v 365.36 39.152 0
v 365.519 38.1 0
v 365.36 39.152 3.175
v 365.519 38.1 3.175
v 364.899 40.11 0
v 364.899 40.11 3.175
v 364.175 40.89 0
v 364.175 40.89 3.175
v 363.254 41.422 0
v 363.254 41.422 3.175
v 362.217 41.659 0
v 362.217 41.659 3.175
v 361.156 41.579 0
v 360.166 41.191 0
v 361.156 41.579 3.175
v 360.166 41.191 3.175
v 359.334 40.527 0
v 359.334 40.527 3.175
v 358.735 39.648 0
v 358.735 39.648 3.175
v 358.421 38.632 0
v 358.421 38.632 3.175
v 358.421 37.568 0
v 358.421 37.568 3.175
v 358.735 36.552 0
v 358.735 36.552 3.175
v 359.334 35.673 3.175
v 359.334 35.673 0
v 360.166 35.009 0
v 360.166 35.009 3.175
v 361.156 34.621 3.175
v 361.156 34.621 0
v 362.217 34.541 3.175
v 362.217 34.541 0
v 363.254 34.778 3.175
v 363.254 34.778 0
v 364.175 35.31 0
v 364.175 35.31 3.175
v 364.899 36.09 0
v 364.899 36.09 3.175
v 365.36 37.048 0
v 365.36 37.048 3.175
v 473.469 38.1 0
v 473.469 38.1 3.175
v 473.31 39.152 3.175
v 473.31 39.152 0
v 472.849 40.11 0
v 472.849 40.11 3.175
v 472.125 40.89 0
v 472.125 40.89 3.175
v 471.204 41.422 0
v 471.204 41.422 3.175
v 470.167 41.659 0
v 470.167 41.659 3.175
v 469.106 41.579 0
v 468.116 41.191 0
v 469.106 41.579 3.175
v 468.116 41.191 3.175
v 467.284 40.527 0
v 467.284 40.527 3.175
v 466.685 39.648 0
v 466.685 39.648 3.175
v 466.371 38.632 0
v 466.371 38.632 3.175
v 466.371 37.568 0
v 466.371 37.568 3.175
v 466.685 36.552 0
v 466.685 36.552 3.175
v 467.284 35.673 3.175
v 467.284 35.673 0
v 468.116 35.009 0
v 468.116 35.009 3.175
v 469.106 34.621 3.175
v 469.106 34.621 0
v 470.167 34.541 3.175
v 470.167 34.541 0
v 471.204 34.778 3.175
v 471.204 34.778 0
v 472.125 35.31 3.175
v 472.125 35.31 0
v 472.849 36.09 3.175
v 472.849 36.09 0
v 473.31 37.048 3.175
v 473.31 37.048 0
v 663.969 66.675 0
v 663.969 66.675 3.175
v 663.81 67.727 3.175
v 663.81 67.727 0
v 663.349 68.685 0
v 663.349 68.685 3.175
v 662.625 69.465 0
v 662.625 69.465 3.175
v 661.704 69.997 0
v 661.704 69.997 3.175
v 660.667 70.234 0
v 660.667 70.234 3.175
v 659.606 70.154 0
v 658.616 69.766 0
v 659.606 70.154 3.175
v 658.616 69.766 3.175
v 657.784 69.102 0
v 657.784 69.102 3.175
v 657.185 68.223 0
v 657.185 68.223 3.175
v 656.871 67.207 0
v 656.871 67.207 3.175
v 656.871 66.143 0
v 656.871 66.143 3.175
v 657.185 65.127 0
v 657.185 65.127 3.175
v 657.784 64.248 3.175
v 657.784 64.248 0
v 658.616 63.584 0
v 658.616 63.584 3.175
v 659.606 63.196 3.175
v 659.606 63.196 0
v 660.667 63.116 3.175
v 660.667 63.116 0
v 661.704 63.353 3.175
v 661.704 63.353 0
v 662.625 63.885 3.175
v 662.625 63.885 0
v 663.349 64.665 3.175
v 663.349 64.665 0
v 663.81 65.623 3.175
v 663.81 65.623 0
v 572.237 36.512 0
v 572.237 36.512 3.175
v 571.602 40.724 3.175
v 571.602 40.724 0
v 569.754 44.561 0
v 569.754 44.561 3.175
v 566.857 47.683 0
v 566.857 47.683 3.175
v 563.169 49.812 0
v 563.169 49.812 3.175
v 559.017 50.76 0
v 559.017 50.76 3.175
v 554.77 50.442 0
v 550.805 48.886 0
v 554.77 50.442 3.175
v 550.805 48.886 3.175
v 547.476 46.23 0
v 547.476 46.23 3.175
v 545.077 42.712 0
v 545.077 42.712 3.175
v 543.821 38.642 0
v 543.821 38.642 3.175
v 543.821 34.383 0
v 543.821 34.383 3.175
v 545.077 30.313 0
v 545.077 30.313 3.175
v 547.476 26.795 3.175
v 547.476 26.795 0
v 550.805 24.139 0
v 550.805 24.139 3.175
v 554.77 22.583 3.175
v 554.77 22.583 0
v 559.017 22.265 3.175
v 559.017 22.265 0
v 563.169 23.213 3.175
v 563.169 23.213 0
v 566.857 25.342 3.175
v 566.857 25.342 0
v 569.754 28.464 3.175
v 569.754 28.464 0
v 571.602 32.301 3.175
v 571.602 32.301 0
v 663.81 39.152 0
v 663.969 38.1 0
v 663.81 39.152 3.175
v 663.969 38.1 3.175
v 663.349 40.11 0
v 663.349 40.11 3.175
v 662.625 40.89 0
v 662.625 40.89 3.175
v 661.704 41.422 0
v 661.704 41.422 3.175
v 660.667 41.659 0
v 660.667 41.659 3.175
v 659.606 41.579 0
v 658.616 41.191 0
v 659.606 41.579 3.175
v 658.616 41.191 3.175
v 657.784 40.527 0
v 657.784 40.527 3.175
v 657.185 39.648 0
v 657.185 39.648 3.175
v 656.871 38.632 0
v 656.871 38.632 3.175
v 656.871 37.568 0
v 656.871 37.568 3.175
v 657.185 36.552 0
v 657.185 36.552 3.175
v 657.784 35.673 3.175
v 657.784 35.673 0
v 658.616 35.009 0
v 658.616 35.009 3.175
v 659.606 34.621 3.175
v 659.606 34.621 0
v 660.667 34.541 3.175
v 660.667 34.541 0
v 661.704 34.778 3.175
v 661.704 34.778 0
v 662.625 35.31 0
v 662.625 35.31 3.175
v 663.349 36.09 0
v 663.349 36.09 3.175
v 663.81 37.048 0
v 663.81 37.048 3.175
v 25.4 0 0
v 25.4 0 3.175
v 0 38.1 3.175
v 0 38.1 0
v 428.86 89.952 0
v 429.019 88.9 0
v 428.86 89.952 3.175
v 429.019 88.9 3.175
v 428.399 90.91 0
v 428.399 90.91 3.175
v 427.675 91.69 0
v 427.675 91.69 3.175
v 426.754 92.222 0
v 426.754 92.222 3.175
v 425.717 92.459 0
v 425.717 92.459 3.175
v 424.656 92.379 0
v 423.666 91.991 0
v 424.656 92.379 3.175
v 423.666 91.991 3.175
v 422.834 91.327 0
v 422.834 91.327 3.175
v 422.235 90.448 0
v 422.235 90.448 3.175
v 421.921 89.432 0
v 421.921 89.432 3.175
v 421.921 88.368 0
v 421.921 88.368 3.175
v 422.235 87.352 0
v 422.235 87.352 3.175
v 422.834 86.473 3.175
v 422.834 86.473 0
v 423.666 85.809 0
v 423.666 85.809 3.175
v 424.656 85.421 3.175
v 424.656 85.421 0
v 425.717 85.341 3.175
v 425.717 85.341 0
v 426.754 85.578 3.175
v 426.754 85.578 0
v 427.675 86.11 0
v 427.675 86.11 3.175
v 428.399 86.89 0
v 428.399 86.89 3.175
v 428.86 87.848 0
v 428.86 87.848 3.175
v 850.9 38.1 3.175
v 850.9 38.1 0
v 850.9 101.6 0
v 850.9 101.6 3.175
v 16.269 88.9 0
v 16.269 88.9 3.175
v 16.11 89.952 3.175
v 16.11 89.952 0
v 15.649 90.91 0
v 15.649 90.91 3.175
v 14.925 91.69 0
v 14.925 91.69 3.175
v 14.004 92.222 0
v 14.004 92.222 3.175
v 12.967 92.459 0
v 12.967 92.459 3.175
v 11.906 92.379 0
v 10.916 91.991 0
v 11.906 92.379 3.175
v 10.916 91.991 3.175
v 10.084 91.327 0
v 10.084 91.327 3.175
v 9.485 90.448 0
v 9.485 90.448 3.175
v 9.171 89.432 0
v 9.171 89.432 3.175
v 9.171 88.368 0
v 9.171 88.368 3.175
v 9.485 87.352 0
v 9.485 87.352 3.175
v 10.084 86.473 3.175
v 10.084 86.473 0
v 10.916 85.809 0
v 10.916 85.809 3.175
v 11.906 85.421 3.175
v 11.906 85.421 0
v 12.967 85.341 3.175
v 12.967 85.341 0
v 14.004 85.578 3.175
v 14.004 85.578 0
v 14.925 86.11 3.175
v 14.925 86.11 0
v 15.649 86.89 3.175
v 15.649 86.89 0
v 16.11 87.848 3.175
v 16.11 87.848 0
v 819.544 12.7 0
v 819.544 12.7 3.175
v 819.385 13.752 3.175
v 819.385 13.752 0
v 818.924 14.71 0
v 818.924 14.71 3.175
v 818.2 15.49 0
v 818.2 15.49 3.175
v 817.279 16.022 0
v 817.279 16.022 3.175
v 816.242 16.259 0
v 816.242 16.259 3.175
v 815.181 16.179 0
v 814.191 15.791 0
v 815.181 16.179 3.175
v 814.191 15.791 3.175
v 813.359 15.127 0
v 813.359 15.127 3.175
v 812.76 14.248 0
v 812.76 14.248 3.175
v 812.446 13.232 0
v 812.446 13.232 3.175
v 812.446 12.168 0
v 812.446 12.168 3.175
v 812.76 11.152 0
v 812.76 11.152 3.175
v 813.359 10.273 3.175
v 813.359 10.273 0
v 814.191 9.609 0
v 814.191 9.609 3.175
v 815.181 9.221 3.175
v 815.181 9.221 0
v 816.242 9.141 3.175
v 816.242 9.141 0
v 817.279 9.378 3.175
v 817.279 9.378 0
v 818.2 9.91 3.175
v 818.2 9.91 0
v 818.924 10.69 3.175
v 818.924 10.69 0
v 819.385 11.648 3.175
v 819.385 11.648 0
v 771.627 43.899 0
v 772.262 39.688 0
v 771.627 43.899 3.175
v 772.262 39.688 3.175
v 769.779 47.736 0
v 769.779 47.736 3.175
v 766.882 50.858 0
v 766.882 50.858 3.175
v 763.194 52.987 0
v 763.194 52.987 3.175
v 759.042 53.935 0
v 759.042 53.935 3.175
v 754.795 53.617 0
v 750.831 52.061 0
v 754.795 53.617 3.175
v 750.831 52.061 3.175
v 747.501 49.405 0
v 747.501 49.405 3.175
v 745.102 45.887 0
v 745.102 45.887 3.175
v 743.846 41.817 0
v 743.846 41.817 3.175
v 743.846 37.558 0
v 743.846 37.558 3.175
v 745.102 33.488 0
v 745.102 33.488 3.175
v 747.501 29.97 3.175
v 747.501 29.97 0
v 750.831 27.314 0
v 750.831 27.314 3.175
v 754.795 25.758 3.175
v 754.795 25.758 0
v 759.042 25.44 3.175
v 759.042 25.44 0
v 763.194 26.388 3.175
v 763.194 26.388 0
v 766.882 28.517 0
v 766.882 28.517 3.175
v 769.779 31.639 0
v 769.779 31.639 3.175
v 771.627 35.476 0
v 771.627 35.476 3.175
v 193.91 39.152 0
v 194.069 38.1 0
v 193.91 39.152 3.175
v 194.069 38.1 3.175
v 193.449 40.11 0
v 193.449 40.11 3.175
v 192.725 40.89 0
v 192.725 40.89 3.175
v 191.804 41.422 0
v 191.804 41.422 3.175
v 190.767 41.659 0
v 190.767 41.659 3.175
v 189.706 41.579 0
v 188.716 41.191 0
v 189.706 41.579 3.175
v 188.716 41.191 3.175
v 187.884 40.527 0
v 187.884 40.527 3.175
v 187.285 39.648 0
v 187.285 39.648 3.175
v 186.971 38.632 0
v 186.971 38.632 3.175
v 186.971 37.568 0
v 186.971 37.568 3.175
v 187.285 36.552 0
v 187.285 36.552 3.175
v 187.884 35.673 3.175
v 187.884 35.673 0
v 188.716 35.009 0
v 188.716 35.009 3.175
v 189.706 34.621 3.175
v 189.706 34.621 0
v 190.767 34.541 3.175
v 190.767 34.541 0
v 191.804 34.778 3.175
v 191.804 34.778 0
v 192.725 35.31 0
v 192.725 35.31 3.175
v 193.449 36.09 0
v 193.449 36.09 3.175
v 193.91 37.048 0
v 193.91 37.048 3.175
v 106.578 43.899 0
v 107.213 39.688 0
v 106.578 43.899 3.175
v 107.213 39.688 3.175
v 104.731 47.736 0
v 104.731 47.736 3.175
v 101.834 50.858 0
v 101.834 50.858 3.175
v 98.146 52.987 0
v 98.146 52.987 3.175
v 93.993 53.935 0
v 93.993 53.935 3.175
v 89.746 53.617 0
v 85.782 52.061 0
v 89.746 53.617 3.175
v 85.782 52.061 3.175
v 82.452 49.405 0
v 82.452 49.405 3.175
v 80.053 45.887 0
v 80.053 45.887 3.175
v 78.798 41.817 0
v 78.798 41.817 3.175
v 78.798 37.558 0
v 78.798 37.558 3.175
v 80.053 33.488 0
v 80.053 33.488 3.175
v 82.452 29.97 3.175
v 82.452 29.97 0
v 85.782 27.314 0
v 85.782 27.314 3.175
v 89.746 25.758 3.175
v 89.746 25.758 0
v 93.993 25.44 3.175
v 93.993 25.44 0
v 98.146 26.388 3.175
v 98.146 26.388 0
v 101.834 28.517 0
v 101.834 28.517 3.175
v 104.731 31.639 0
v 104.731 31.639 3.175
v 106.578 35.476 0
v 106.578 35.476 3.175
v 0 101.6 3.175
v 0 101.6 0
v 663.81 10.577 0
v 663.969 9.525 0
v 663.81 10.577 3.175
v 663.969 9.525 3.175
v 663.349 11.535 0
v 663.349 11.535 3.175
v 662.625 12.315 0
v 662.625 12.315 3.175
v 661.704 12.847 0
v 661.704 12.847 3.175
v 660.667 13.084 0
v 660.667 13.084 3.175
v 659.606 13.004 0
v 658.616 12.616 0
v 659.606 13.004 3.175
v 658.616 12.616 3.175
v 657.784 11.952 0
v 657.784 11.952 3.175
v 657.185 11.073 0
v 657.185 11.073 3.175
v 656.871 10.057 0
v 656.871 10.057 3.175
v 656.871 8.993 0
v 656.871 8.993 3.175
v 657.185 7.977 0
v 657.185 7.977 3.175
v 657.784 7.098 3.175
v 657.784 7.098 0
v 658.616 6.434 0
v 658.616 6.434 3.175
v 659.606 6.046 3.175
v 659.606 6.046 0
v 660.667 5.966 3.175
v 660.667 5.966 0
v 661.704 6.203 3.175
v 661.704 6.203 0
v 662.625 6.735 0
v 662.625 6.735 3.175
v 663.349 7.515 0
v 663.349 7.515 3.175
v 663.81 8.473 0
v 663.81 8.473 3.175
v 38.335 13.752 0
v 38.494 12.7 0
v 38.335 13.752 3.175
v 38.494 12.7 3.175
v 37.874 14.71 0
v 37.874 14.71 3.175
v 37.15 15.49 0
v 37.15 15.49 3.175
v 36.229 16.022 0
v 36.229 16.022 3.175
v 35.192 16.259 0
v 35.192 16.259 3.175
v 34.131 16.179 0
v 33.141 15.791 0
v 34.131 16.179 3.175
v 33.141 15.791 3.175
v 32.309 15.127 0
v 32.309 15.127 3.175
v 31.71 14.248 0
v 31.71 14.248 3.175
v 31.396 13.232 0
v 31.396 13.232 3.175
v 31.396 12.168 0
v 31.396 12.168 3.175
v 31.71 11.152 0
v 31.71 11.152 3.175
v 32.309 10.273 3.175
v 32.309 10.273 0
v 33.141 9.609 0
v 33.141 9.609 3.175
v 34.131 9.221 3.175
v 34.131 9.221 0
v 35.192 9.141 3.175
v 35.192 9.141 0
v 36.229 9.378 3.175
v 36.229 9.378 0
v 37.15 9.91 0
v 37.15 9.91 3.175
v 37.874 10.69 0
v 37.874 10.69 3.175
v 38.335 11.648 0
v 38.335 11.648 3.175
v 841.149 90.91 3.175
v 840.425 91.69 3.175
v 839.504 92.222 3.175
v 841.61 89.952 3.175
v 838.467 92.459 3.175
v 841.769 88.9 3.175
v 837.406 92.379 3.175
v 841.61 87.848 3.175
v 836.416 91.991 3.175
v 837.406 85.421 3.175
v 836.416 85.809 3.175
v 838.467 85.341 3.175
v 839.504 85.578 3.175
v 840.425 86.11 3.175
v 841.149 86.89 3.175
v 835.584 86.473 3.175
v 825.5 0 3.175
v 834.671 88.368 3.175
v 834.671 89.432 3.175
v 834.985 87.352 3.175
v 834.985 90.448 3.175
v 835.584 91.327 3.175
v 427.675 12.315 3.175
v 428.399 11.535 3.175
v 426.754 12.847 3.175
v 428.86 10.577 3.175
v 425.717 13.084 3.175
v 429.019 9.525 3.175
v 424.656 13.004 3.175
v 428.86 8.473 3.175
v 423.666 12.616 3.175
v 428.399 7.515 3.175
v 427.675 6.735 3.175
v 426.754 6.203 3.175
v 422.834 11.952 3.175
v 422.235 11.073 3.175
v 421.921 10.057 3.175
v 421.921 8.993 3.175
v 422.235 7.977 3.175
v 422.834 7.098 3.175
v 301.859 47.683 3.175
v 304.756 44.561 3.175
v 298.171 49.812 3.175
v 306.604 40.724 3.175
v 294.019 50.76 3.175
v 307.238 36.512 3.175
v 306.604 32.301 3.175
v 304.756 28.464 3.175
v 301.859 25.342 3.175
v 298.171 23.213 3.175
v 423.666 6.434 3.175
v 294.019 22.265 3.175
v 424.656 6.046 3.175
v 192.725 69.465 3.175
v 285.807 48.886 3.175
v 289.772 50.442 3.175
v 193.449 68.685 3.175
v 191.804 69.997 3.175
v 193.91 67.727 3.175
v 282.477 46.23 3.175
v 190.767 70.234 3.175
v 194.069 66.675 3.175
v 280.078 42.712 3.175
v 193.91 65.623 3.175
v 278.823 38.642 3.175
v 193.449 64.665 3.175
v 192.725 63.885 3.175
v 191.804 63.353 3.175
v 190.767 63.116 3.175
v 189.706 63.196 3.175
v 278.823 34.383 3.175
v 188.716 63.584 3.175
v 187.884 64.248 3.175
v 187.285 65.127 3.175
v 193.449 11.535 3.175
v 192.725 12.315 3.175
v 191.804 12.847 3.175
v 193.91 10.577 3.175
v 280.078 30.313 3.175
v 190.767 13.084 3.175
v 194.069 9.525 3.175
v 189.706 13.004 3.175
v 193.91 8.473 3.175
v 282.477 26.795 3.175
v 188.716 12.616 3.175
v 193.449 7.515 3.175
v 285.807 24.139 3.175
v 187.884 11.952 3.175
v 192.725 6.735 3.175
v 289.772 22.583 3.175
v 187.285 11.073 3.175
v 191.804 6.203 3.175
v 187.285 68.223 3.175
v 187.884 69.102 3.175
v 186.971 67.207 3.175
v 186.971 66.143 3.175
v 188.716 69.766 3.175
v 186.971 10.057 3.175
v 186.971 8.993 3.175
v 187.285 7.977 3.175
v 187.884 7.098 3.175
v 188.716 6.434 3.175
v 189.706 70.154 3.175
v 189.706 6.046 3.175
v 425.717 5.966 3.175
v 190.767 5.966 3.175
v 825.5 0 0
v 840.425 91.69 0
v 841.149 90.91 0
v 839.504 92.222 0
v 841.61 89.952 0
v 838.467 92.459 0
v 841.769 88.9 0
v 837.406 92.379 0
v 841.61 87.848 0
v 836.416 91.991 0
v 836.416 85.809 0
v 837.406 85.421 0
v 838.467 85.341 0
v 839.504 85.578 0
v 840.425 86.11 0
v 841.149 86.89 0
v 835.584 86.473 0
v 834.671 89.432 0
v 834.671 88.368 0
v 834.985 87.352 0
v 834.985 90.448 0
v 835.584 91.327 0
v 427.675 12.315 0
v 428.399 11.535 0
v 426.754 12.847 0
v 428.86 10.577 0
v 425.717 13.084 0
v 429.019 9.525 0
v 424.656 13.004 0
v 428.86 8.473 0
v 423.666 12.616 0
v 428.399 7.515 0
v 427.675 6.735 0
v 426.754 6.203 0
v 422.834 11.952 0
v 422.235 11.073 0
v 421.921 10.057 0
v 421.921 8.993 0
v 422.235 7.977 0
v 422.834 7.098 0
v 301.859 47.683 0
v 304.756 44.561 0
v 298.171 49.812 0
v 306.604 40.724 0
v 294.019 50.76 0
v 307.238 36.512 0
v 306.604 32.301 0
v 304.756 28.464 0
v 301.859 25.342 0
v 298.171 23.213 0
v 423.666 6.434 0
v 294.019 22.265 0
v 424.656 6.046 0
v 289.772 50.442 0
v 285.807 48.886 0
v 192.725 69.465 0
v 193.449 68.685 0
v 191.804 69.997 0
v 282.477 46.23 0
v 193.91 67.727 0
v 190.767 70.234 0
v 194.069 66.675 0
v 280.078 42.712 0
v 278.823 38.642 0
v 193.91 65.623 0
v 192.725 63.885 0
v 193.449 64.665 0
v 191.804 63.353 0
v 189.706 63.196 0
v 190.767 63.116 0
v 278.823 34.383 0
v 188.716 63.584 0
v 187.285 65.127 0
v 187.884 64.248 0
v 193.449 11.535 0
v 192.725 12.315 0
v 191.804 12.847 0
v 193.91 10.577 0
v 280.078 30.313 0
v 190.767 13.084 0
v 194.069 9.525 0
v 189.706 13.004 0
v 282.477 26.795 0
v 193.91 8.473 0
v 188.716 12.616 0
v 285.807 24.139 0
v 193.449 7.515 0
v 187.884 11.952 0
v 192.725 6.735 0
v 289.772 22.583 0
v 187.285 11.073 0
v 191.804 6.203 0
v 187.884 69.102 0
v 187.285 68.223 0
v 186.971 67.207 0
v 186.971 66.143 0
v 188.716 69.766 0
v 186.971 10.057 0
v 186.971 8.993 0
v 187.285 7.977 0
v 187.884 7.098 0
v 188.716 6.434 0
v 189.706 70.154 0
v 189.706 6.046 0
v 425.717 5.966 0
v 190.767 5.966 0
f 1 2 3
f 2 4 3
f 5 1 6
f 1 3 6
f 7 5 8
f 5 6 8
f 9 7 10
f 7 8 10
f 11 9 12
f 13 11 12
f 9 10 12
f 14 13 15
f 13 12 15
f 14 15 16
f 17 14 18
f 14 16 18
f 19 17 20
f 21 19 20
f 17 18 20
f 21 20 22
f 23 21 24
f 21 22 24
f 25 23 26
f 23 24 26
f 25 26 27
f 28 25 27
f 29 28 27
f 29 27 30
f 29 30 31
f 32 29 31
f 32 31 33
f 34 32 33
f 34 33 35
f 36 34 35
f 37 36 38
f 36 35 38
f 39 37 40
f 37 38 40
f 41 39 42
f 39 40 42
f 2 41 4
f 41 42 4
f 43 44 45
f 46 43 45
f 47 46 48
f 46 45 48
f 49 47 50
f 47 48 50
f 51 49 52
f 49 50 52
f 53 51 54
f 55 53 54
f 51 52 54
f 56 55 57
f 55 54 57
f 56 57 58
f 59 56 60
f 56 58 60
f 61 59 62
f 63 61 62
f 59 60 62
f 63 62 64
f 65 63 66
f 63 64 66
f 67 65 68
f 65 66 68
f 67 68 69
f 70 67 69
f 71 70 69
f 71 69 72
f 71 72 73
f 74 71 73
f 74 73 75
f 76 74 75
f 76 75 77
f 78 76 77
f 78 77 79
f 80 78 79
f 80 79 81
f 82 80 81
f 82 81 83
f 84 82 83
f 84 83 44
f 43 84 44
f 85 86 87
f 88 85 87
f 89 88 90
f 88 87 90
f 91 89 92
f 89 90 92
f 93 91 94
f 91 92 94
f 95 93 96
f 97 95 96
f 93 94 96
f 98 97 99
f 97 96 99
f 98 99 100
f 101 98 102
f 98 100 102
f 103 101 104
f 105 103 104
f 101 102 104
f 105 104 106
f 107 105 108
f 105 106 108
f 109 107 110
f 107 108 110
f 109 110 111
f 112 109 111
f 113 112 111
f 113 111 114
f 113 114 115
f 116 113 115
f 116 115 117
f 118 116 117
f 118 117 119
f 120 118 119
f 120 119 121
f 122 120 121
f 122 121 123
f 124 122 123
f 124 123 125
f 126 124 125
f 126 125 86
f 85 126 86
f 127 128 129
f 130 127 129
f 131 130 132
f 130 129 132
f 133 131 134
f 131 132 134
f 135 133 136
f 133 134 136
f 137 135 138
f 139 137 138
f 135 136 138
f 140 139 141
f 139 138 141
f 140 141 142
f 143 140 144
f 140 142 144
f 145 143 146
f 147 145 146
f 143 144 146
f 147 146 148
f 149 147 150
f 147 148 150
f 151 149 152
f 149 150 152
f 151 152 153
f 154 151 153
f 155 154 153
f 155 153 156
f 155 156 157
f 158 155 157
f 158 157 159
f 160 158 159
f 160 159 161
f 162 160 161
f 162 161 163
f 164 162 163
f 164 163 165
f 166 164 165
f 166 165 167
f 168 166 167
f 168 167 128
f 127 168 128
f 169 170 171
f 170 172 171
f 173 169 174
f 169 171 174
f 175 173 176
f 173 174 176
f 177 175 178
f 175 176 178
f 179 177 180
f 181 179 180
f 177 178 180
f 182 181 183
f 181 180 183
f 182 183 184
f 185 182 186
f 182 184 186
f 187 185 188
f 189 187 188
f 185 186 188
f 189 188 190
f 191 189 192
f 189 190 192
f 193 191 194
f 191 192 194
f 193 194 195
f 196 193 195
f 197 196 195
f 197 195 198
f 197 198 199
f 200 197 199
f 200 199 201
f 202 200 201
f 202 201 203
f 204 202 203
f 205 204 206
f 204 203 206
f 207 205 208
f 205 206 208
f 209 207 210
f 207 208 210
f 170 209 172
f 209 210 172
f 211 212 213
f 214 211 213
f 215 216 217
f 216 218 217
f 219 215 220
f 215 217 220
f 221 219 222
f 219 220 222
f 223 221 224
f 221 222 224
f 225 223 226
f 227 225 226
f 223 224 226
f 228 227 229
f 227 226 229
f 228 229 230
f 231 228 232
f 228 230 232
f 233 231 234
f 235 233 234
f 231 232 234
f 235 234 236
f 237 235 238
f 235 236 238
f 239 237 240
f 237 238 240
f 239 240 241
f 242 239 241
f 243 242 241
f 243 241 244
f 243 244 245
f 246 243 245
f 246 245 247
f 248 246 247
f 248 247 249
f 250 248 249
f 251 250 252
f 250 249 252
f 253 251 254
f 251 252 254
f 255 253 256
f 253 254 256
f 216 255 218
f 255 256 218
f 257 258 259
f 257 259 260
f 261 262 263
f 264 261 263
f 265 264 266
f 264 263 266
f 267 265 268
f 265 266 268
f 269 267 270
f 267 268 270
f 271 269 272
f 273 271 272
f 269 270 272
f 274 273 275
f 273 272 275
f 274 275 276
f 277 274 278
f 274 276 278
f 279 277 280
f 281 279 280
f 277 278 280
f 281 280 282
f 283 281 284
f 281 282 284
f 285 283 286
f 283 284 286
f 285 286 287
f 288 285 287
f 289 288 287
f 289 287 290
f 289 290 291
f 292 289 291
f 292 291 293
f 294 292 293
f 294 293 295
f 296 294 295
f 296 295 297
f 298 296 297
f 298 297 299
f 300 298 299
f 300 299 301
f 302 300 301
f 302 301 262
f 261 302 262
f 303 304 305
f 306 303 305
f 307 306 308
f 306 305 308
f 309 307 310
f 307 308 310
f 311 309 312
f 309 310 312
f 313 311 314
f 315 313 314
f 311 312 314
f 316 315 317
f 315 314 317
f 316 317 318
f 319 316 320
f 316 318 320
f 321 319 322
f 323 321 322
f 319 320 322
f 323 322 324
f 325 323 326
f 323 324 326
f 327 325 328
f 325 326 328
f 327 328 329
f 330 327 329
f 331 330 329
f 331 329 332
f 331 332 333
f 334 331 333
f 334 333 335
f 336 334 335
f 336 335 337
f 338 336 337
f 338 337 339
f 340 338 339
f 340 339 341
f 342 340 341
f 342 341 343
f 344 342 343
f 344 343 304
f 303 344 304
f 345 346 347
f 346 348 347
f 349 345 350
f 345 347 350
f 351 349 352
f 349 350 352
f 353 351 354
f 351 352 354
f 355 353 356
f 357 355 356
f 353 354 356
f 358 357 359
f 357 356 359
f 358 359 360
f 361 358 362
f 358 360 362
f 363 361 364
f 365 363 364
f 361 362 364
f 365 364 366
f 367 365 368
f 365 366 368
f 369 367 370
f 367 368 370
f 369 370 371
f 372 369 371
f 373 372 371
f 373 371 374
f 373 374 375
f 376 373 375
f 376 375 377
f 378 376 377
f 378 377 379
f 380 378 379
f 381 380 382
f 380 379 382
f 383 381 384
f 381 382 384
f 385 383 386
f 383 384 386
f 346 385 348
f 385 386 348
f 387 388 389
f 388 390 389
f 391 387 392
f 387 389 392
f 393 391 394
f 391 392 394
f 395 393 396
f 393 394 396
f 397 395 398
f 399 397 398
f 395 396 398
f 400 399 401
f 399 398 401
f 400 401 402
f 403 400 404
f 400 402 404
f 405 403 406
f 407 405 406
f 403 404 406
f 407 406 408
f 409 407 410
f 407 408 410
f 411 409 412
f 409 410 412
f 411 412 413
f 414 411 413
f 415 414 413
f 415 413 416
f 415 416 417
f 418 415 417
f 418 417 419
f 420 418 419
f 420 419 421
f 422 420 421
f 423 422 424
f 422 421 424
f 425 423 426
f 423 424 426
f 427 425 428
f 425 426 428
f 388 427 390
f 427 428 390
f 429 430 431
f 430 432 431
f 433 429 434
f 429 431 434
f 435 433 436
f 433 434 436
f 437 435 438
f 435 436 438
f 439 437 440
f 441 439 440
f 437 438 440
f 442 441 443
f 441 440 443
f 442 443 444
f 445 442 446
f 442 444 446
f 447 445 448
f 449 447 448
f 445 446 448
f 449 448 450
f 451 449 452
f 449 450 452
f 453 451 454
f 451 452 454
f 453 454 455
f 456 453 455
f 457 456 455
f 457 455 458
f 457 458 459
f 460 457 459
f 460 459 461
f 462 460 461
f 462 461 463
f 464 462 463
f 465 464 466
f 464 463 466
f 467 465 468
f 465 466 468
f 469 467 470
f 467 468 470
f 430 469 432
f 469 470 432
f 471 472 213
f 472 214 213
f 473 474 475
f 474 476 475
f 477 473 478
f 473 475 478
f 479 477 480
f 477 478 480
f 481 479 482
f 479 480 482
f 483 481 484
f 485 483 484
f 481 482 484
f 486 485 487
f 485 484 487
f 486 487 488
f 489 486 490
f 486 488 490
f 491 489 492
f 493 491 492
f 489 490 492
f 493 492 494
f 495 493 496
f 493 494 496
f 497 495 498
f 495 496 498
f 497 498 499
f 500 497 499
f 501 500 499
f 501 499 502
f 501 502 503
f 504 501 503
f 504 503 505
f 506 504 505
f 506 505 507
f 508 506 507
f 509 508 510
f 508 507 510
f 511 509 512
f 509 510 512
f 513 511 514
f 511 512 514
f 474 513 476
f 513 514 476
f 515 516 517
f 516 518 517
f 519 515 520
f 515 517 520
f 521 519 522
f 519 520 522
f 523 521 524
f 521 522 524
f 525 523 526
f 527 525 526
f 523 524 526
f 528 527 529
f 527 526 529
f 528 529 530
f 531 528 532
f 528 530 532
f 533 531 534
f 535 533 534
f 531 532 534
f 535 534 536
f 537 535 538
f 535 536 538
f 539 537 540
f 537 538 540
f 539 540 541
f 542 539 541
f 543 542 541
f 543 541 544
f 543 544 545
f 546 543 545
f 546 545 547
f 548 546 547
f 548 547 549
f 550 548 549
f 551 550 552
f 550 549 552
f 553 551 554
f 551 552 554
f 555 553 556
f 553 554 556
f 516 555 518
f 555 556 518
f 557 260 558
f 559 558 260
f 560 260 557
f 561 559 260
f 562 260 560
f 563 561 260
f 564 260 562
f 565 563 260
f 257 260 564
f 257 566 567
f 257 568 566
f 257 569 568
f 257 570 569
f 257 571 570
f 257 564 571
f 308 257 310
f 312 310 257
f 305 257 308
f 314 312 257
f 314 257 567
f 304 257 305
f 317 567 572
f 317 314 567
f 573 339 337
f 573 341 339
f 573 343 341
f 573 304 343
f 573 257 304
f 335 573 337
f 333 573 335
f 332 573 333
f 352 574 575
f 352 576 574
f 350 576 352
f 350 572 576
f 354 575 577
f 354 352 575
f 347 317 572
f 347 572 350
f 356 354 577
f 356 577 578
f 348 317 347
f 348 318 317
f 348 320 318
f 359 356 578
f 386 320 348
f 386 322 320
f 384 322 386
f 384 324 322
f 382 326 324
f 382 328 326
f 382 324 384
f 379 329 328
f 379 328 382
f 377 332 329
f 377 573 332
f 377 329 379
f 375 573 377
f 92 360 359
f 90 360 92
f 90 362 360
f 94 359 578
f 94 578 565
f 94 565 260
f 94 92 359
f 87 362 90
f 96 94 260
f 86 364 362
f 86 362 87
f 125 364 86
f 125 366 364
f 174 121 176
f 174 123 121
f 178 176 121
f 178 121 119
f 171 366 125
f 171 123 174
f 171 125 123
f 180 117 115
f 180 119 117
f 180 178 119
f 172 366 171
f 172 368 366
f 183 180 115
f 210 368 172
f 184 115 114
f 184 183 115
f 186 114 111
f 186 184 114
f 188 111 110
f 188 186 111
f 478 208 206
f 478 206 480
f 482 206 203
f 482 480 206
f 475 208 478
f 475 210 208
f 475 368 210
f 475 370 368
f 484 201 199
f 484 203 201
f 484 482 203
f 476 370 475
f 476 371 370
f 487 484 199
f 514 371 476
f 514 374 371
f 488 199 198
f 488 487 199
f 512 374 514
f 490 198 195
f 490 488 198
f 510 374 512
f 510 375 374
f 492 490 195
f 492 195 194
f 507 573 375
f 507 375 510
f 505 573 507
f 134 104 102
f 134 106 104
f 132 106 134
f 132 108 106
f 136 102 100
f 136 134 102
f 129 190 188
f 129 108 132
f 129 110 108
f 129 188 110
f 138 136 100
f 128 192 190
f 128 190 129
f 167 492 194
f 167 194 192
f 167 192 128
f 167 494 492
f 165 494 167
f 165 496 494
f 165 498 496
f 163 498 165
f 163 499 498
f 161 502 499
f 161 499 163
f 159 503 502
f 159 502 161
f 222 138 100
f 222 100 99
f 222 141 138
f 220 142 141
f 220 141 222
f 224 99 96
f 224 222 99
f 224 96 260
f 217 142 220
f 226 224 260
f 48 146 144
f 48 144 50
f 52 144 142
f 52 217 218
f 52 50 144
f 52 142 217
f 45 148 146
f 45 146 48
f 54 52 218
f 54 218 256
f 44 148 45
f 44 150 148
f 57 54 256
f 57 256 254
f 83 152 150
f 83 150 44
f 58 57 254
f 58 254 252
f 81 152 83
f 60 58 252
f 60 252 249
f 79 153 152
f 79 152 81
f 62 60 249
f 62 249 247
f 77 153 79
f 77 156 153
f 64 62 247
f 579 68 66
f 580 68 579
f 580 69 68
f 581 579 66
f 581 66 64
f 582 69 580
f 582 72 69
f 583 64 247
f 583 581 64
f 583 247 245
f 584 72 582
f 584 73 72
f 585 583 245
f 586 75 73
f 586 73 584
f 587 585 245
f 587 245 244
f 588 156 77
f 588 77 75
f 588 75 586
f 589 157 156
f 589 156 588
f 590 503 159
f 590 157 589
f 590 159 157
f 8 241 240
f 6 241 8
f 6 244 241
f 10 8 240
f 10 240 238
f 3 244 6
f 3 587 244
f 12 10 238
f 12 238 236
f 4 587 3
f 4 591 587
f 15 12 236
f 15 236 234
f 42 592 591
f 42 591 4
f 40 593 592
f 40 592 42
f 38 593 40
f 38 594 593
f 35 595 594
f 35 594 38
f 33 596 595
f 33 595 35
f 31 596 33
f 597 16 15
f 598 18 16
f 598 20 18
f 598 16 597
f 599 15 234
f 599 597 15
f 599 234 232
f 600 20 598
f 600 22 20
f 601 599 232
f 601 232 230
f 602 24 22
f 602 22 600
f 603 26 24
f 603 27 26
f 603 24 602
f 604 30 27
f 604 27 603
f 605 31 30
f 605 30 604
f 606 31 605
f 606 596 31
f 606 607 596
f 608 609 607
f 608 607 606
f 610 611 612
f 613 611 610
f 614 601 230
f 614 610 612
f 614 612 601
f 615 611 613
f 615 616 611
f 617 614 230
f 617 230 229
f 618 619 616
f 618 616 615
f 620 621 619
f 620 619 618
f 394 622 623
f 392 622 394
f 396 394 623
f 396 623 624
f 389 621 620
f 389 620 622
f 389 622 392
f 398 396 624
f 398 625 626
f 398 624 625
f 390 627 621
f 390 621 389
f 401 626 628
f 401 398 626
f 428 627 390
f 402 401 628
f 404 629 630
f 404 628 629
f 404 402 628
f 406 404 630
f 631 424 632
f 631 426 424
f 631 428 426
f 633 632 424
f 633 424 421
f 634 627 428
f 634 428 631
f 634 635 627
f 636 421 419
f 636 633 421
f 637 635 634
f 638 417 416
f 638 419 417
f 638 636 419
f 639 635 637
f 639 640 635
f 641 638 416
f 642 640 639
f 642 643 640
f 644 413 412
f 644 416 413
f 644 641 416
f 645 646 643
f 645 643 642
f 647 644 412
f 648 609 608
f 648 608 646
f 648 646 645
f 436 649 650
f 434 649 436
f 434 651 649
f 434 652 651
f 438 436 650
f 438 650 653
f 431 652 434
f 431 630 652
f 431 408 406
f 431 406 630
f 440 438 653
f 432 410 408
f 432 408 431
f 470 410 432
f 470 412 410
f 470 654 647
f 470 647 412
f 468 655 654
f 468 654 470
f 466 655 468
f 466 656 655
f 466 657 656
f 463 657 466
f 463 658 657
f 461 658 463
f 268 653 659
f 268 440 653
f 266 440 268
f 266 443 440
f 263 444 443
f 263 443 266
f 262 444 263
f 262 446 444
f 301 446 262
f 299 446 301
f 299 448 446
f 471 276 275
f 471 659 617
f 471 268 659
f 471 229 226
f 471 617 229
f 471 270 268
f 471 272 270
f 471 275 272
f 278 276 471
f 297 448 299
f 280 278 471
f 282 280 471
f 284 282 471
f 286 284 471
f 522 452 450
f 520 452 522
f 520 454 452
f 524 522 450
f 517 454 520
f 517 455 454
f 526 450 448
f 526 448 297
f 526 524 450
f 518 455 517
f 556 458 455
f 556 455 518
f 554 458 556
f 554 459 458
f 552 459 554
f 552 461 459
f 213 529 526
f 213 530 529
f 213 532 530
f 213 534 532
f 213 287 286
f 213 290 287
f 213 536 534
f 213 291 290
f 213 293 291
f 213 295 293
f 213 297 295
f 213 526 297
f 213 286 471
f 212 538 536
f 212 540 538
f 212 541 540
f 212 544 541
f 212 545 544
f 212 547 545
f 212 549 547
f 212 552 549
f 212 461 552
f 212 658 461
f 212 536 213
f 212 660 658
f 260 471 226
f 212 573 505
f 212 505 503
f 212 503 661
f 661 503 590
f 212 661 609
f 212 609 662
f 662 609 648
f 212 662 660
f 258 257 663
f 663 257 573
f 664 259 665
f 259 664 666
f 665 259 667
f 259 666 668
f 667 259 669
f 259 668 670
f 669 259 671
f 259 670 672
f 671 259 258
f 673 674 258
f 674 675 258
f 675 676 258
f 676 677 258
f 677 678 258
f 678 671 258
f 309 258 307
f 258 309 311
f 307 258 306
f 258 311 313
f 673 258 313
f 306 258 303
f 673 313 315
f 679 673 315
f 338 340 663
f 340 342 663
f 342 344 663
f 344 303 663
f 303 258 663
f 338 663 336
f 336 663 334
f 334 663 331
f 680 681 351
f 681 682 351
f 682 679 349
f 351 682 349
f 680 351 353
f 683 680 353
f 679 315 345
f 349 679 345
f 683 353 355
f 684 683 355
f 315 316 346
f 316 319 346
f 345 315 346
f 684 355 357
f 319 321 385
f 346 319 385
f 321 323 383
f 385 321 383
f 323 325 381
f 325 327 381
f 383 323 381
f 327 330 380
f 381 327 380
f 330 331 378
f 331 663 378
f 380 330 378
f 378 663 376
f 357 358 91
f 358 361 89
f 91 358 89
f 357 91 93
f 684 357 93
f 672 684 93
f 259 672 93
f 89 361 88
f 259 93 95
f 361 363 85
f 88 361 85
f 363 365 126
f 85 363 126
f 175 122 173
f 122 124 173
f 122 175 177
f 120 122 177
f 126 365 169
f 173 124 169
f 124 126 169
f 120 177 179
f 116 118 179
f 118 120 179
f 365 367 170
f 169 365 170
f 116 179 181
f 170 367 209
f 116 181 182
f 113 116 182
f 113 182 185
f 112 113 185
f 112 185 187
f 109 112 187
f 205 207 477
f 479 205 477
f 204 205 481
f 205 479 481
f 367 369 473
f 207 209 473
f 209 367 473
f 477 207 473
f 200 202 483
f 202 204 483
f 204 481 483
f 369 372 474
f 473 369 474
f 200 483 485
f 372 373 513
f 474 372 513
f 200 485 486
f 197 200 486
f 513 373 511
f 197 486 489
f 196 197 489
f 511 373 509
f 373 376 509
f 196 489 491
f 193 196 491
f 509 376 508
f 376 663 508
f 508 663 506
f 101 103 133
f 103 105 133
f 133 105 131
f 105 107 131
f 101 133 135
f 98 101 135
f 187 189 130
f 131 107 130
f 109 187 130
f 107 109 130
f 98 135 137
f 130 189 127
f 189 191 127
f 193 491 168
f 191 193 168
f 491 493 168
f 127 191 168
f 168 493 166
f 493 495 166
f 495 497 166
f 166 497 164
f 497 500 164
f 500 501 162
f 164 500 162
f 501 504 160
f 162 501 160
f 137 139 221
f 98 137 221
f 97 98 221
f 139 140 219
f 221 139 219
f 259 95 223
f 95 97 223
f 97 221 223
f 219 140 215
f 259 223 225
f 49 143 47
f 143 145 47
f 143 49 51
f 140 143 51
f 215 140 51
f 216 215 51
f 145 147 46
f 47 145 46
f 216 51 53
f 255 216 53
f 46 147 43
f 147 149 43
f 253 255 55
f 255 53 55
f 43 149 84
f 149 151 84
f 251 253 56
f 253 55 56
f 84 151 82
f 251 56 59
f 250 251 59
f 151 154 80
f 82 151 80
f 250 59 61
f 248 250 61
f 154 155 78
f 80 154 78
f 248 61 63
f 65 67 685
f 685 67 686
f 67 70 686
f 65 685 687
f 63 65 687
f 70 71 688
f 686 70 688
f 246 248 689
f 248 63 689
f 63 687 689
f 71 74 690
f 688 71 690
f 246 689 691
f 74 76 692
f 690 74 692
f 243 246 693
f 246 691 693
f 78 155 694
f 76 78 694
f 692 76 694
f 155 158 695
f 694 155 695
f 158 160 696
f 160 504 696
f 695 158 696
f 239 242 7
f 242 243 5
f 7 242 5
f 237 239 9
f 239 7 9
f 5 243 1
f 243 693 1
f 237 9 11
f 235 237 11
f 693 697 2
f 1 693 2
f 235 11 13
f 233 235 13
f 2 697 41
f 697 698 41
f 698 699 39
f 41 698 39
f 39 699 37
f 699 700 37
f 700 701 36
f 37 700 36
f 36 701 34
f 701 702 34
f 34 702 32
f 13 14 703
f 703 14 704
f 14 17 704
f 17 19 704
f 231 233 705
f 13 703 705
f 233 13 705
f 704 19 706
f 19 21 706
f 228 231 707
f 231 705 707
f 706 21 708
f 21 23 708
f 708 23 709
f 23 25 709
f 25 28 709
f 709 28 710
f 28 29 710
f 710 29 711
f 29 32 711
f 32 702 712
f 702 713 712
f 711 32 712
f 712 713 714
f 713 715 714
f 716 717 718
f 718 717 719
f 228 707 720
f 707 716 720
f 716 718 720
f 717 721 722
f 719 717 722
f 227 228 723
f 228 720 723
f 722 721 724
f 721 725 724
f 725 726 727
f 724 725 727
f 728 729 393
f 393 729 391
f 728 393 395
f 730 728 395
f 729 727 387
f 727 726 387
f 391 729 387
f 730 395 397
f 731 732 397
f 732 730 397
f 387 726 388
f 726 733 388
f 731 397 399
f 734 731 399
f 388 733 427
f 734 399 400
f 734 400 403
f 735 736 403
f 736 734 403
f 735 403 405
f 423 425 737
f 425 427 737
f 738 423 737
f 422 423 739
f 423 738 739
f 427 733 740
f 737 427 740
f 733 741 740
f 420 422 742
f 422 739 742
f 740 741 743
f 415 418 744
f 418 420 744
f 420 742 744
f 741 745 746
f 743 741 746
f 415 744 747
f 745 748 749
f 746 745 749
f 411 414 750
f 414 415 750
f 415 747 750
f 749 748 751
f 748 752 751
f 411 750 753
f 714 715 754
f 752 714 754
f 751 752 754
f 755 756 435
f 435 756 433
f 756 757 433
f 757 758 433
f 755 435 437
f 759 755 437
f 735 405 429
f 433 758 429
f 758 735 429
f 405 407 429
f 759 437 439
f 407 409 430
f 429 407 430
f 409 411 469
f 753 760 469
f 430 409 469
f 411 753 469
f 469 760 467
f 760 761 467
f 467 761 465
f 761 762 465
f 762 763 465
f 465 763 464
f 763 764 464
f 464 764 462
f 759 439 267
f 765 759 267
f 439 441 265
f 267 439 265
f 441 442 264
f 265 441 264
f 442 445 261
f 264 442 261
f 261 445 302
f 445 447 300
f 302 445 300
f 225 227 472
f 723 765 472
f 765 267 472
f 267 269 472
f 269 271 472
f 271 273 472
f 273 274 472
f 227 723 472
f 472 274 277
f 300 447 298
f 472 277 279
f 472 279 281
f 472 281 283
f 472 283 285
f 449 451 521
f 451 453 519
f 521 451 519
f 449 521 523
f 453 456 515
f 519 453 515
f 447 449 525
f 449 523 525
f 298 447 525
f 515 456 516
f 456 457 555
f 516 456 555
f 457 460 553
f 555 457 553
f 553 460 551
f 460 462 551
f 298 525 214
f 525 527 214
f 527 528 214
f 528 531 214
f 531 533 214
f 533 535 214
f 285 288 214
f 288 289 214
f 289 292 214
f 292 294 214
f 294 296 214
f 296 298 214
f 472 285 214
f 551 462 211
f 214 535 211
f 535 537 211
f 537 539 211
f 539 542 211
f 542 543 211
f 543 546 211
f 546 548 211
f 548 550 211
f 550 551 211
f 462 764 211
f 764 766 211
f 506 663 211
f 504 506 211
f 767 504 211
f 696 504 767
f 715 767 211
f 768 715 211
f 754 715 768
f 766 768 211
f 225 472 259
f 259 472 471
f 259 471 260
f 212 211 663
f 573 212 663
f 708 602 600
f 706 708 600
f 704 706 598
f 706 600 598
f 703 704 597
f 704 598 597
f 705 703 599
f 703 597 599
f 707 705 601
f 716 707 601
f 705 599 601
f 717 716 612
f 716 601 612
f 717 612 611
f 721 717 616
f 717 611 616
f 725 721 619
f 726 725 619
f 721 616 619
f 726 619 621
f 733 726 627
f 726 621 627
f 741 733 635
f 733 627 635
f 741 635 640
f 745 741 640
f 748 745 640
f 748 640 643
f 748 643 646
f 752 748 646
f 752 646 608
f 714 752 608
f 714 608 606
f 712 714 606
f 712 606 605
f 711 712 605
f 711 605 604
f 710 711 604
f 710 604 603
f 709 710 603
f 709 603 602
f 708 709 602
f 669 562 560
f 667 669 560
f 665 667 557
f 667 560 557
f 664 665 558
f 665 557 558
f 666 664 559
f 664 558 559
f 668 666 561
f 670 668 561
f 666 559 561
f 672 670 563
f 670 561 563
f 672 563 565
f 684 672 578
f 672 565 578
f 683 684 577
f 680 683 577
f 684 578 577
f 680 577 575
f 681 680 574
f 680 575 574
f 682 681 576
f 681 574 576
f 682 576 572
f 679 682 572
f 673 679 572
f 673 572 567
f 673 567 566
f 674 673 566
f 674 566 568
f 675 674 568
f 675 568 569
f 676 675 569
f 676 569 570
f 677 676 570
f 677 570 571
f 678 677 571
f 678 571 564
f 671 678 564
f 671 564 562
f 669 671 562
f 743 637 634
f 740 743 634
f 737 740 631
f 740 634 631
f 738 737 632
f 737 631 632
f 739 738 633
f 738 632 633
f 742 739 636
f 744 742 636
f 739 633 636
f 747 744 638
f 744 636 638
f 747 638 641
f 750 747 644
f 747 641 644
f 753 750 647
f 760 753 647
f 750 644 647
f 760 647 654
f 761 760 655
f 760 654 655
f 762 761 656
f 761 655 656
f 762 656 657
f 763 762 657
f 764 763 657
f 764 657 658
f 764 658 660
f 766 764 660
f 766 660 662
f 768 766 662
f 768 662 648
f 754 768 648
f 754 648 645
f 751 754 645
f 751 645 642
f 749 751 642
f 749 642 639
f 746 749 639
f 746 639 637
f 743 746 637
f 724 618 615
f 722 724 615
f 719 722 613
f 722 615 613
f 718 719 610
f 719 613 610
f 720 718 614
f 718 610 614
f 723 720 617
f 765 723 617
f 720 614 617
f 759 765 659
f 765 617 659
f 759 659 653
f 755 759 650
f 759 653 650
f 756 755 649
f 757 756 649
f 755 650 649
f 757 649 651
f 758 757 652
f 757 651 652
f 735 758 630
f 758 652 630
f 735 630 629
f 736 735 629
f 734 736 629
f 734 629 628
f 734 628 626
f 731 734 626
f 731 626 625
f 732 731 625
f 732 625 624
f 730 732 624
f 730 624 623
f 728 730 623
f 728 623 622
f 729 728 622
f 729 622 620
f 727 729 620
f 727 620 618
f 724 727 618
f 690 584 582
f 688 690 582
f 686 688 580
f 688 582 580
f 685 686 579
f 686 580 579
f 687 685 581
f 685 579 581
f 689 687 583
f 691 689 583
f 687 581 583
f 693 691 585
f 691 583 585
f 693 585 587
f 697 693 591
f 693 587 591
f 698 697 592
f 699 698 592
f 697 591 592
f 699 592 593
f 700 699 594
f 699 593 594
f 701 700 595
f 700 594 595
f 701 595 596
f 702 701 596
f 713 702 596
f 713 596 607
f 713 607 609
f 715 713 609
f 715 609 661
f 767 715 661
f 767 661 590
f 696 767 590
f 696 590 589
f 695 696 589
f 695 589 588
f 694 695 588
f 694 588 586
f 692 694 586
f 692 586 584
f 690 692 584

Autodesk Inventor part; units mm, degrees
ref_plane "YZ Plane" through (0, 0, 0) normal (1, 0, 0) x (0, 1, 0)
ref_plane "XZ Plane" through (0, 0, 0) normal (0, 1, 0) x (-1, 0, 0)
ref_plane "XY Plane" through (0, 0, 0) normal (0, 0, 1) x (1, 0, 0)
sketch "Sketch1" plane through (0, 0, 0) normal (0, 0, 1) x (1, 0, 0)
  line L0 (0, 0) -> (850.9, 0)
  line L1 (850.9, 0) -> (850.9, 76.2)
  line L2 (850.9, 76.2) -> (0, 76.2)
  line L3 (0, 76.2) -> (0, 0)
  dimension "d0" = 850.9
  dimension "d1" = 76.2
extrude "Extrusion1" add sketch "Sketch1" along normal blind 3.175
sketch "Sketch4" plane through (0, 0, 3.175) normal (0, 0, 1) x (1, 0, 0)
  line L0 (0, 0) -> (0, 38.1)
  line L1 (0, 76.2) -> (0, 0) projected
  line L2 (0, 0) -> (25.4, 0)
  line L3 (0, 0) -> (850.9, 0) projected
  line L4 (25.4, 0) -> (0, 38.1)
  line L5 (850.9, 0) -> (825.5, 0)
  line L6 (850.9, 0) -> (850.9, 38.1)
  line L7 (850.9, 0) -> (850.9, 76.2) projected
  line L8 (850.9, 38.1) -> (825.5, 0)
  line L9 (0, 38.1) -> (0, 36.5125)
  circle A0 centre (292.9509, 36.5125) radius 14.2875
  circle A1 centre (557.9491, 36.5125) radius 14.2875
  circle A2 centre (757.9743, 39.6875) radius 14.2875
  circle A3 centre (92.9257, 39.6875) radius 14.2875
  dimension "d24" = 38.1
  dimension "d26" = 25.4
  dimension "d27" = 38.1
  dimension "d33" = 28.575
  dimension "d34" = 28.575
  dimension "d38" = 28.575
  dimension "d39" = 28.575
extrude "Extrusion3" cut sketch "Sketch4" against normal blind 3.175
sketch "Sketch5" plane through (0, 0, 3.175) normal (0, 0, 1) x (1, 0, 0)
  line L0 (850.9, 76.2) -> (0, 76.2) projected
  line L1 (0, 76.2) -> (425.45, 76.2)
  circle A0 centre (425.45, 66.675) radius 3.5687
  circle A1 centre (425.45, 9.525) radius 3.5687
  line L2 (25.4, 0) -> (825.5, 0) projected
  line L3 (0, 76.2) -> (190.5, 76.2)
  circle A2 centre (190.5, 66.675) radius 3.5687
  circle A3 centre (190.5, 9.525) radius 3.5687
  circle A4 centre (190.5, 38.1) radius 3.5687
  line L4 (850.9, 38.1) -> (850.9, 76.2) projected
  line L5 (850.9, 76.2) -> (660.4, 76.2)
  circle A5 centre (660.4, 66.675) radius 3.5687
  circle A6 centre (660.4, 9.525) radius 3.5687
  circle A7 centre (660.4, 38.1) radius 3.5687
  circle A8 centre (838.2, 63.5) radius 3.5687
  circle A9 centre (12.7, 63.5) radius 3.5687
  line L6 (0, 76.2) -> (0, 38.1) projected
  circle A10 centre (34.925, 12.7) radius 3.5687
  circle A11 centre (815.975, 12.7) radius 3.5687
  point P0 (0, 0)
  dimension "d42" = 425.45
  dimension "d43" = 7.1374
  dimension "d44" = 9.525
  dimension "d45" = 7.1374
  dimension "d46" = 9.525
  dimension "d47" = 190.5
  dimension "d48" = 7.1374
  dimension "d49" = 9.525
  dimension "d50" = 7.1374
  dimension "d51" = 9.525
  dimension "d52" = 7.1374
  dimension "d53" = 38.1
  dimension "d54" = 190.5
  dimension "d55" = 7.1374
  dimension "d56" = 9.525
  dimension "d57" = 7.1374
  dimension "d58" = 9.525
  dimension "d59" = 7.1374
  dimension "d60" = 38.1
  dimension "d61" = 7.1374
  dimension "d62" = 12.7
  dimension "d63" = 12.7
  dimension "d64" = 7.1374
  dimension "d65" = 12.7
  dimension "d66" = 12.7
  dimension "d67" = 7.1374
  dimension "d69" = 12.7
  dimension "d70" = 9.525
  dimension "d71" = 7.1374
  dimension "d72" = 12.7
  dimension "d73" = 9.525
extrude "Extrusion4" cut sketch "Sketch5" against normal blind 3.175
sketch "Sketch6" plane through (0, 0, 3.175) normal (0, 0, 1) x (1, 0, 0)
  circle A0 centre (361.95, 38.1) radius 3.5687
  circle A1 centre (469.9, 38.1) radius 3.5687
  line L0 (850.9, 76.2) -> (0, 76.2) projected
  circle A2 centre (292.9509, 36.5125) radius 14.2875 projected
  line L1 (0, 76.2) -> (0, 38.1) projected
  line L2 (850.9, 38.1) -> (850.9, 76.2) projected
  point P0 (0, 0)
  dimension "d76" = 7.1374
  dimension "d77" = 7.1374
  dimension "d78" = 38.1
  dimension "d79" = 38.1
  dimension "d82" = 381
  dimension "d83" = 361.95
extrude "Extrusion6" cut sketch "Sketch6" against normal blind 25.4 contours A0 | A1
sketch "Sketch7" plane through (0, 76.2, 0) normal (0, 1, 0) x (1, 0, 0)
  line L0 (850.9, 0) -> (0, 0) projected
  line L1 (0, 0) -> (0, -3.175) projected
  line L2 (850.9, -3.175) -> (0, -3.175) projected
  line L3 (850.9, 0) -> (850.9, -3.175) projected
extrude "Extrusion7" add sketch "Sketch7" along normal blind 25.4
sketch "Sketch8" plane through (0, 0, 3.175) normal (0, 0, 1) x (1, 0, 0)
  circle A0 centre (12.7, 63.5) radius 3.5687 projected
  circle A1 centre (838.2, 63.5) radius 3.5687 projected
  circle A2 centre (425.45, 66.675) radius 3.5687 projected
  point P0 (0, 0)
extrude "Extrusion9" add sketch "Sketch8" against normal blind 3.175
sketch "Sketch9" plane through (0, 0, 3.175) normal (0, 0, 1) x (1, 0, 0)
  circle A0 centre (12.7, 88.9) radius 3.5687
  line L0 (0, 101.6) -> (850.9, 101.6) projected
  line L1 (0, 38.1) -> (0, 101.6) projected
  circle A1 centre (838.2, 88.9) radius 3.5687
  line L2 (850.9, 38.1) -> (850.9, 101.6) projected
  circle A2 centre (425.45, 88.9) radius 3.5687
  point P0 (0, 0)
  dimension "d95" = 7.1374
  dimension "d96" = 12.7
  dimension "d97" = 12.7
  dimension "d98" = 7.1374
  dimension "d99" = 12.7
  dimension "d100" = 12.7
  dimension "d101" = 7.1374
extrude "Extrusion10" cut sketch "Sketch9" against normal blind 3.175
properties part number "OutsidePlate2" material "Aluminum 6061"
